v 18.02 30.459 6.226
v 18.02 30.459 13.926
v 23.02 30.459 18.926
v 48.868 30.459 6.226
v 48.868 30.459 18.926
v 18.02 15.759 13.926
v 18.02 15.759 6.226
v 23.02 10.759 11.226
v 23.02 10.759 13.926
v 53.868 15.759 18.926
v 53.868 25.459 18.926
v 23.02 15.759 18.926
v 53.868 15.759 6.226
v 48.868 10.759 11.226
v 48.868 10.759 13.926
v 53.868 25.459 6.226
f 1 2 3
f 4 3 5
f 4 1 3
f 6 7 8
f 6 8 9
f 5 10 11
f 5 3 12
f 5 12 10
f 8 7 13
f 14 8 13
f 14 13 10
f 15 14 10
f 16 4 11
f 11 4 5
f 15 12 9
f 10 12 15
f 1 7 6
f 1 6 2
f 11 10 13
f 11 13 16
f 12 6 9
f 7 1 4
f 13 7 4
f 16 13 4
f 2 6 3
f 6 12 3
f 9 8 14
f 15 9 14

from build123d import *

# Parameters (mm, degrees)
SKETCH1_W           = 71.695166663
SKETCH1_H           = 39.401169853
BOSS_EXTRUDE1_DEPTH = 25.4
CHAMFER1_SIZE       = 10
SCALE1_SCALE        = 0.5


with BuildPart() as part:
    # Sketch1 → Boss-Extrude1 (new body)
    with BuildSketch(Plane.XY):
        with Locations((35.847583332, 19.700584926)):
            Rectangle(SKETCH1_W, SKETCH1_H)
    extrude(amount=BOSS_EXTRUDE1_DEPTH)

    # Chamfer1
    chamfer1_edges = [part.edges().sort_by_distance(p)[0] for p in [
        (0, 19.700584926, 25.4),
        (35.847583331, 0, 0),
        (71.695166663, 39.401169853, 12.7),
        (71.695166663, 0, 12.7),
        (0, 0, 12.7),
        (35.847583331, 0, 25.4),
    ]]
    chamfer(chamfer1_edges, length=CHAMFER1_SIZE)


with BuildPart() as part_1:
    # Scale1: scaled about (36.040178536, 21.517729934, 12.451063985)
    add(part.part.scale(SCALE1_SCALE).moved(Location((18.020089268, 10.758864967, 6.225531992))))


solid = part_1.part
